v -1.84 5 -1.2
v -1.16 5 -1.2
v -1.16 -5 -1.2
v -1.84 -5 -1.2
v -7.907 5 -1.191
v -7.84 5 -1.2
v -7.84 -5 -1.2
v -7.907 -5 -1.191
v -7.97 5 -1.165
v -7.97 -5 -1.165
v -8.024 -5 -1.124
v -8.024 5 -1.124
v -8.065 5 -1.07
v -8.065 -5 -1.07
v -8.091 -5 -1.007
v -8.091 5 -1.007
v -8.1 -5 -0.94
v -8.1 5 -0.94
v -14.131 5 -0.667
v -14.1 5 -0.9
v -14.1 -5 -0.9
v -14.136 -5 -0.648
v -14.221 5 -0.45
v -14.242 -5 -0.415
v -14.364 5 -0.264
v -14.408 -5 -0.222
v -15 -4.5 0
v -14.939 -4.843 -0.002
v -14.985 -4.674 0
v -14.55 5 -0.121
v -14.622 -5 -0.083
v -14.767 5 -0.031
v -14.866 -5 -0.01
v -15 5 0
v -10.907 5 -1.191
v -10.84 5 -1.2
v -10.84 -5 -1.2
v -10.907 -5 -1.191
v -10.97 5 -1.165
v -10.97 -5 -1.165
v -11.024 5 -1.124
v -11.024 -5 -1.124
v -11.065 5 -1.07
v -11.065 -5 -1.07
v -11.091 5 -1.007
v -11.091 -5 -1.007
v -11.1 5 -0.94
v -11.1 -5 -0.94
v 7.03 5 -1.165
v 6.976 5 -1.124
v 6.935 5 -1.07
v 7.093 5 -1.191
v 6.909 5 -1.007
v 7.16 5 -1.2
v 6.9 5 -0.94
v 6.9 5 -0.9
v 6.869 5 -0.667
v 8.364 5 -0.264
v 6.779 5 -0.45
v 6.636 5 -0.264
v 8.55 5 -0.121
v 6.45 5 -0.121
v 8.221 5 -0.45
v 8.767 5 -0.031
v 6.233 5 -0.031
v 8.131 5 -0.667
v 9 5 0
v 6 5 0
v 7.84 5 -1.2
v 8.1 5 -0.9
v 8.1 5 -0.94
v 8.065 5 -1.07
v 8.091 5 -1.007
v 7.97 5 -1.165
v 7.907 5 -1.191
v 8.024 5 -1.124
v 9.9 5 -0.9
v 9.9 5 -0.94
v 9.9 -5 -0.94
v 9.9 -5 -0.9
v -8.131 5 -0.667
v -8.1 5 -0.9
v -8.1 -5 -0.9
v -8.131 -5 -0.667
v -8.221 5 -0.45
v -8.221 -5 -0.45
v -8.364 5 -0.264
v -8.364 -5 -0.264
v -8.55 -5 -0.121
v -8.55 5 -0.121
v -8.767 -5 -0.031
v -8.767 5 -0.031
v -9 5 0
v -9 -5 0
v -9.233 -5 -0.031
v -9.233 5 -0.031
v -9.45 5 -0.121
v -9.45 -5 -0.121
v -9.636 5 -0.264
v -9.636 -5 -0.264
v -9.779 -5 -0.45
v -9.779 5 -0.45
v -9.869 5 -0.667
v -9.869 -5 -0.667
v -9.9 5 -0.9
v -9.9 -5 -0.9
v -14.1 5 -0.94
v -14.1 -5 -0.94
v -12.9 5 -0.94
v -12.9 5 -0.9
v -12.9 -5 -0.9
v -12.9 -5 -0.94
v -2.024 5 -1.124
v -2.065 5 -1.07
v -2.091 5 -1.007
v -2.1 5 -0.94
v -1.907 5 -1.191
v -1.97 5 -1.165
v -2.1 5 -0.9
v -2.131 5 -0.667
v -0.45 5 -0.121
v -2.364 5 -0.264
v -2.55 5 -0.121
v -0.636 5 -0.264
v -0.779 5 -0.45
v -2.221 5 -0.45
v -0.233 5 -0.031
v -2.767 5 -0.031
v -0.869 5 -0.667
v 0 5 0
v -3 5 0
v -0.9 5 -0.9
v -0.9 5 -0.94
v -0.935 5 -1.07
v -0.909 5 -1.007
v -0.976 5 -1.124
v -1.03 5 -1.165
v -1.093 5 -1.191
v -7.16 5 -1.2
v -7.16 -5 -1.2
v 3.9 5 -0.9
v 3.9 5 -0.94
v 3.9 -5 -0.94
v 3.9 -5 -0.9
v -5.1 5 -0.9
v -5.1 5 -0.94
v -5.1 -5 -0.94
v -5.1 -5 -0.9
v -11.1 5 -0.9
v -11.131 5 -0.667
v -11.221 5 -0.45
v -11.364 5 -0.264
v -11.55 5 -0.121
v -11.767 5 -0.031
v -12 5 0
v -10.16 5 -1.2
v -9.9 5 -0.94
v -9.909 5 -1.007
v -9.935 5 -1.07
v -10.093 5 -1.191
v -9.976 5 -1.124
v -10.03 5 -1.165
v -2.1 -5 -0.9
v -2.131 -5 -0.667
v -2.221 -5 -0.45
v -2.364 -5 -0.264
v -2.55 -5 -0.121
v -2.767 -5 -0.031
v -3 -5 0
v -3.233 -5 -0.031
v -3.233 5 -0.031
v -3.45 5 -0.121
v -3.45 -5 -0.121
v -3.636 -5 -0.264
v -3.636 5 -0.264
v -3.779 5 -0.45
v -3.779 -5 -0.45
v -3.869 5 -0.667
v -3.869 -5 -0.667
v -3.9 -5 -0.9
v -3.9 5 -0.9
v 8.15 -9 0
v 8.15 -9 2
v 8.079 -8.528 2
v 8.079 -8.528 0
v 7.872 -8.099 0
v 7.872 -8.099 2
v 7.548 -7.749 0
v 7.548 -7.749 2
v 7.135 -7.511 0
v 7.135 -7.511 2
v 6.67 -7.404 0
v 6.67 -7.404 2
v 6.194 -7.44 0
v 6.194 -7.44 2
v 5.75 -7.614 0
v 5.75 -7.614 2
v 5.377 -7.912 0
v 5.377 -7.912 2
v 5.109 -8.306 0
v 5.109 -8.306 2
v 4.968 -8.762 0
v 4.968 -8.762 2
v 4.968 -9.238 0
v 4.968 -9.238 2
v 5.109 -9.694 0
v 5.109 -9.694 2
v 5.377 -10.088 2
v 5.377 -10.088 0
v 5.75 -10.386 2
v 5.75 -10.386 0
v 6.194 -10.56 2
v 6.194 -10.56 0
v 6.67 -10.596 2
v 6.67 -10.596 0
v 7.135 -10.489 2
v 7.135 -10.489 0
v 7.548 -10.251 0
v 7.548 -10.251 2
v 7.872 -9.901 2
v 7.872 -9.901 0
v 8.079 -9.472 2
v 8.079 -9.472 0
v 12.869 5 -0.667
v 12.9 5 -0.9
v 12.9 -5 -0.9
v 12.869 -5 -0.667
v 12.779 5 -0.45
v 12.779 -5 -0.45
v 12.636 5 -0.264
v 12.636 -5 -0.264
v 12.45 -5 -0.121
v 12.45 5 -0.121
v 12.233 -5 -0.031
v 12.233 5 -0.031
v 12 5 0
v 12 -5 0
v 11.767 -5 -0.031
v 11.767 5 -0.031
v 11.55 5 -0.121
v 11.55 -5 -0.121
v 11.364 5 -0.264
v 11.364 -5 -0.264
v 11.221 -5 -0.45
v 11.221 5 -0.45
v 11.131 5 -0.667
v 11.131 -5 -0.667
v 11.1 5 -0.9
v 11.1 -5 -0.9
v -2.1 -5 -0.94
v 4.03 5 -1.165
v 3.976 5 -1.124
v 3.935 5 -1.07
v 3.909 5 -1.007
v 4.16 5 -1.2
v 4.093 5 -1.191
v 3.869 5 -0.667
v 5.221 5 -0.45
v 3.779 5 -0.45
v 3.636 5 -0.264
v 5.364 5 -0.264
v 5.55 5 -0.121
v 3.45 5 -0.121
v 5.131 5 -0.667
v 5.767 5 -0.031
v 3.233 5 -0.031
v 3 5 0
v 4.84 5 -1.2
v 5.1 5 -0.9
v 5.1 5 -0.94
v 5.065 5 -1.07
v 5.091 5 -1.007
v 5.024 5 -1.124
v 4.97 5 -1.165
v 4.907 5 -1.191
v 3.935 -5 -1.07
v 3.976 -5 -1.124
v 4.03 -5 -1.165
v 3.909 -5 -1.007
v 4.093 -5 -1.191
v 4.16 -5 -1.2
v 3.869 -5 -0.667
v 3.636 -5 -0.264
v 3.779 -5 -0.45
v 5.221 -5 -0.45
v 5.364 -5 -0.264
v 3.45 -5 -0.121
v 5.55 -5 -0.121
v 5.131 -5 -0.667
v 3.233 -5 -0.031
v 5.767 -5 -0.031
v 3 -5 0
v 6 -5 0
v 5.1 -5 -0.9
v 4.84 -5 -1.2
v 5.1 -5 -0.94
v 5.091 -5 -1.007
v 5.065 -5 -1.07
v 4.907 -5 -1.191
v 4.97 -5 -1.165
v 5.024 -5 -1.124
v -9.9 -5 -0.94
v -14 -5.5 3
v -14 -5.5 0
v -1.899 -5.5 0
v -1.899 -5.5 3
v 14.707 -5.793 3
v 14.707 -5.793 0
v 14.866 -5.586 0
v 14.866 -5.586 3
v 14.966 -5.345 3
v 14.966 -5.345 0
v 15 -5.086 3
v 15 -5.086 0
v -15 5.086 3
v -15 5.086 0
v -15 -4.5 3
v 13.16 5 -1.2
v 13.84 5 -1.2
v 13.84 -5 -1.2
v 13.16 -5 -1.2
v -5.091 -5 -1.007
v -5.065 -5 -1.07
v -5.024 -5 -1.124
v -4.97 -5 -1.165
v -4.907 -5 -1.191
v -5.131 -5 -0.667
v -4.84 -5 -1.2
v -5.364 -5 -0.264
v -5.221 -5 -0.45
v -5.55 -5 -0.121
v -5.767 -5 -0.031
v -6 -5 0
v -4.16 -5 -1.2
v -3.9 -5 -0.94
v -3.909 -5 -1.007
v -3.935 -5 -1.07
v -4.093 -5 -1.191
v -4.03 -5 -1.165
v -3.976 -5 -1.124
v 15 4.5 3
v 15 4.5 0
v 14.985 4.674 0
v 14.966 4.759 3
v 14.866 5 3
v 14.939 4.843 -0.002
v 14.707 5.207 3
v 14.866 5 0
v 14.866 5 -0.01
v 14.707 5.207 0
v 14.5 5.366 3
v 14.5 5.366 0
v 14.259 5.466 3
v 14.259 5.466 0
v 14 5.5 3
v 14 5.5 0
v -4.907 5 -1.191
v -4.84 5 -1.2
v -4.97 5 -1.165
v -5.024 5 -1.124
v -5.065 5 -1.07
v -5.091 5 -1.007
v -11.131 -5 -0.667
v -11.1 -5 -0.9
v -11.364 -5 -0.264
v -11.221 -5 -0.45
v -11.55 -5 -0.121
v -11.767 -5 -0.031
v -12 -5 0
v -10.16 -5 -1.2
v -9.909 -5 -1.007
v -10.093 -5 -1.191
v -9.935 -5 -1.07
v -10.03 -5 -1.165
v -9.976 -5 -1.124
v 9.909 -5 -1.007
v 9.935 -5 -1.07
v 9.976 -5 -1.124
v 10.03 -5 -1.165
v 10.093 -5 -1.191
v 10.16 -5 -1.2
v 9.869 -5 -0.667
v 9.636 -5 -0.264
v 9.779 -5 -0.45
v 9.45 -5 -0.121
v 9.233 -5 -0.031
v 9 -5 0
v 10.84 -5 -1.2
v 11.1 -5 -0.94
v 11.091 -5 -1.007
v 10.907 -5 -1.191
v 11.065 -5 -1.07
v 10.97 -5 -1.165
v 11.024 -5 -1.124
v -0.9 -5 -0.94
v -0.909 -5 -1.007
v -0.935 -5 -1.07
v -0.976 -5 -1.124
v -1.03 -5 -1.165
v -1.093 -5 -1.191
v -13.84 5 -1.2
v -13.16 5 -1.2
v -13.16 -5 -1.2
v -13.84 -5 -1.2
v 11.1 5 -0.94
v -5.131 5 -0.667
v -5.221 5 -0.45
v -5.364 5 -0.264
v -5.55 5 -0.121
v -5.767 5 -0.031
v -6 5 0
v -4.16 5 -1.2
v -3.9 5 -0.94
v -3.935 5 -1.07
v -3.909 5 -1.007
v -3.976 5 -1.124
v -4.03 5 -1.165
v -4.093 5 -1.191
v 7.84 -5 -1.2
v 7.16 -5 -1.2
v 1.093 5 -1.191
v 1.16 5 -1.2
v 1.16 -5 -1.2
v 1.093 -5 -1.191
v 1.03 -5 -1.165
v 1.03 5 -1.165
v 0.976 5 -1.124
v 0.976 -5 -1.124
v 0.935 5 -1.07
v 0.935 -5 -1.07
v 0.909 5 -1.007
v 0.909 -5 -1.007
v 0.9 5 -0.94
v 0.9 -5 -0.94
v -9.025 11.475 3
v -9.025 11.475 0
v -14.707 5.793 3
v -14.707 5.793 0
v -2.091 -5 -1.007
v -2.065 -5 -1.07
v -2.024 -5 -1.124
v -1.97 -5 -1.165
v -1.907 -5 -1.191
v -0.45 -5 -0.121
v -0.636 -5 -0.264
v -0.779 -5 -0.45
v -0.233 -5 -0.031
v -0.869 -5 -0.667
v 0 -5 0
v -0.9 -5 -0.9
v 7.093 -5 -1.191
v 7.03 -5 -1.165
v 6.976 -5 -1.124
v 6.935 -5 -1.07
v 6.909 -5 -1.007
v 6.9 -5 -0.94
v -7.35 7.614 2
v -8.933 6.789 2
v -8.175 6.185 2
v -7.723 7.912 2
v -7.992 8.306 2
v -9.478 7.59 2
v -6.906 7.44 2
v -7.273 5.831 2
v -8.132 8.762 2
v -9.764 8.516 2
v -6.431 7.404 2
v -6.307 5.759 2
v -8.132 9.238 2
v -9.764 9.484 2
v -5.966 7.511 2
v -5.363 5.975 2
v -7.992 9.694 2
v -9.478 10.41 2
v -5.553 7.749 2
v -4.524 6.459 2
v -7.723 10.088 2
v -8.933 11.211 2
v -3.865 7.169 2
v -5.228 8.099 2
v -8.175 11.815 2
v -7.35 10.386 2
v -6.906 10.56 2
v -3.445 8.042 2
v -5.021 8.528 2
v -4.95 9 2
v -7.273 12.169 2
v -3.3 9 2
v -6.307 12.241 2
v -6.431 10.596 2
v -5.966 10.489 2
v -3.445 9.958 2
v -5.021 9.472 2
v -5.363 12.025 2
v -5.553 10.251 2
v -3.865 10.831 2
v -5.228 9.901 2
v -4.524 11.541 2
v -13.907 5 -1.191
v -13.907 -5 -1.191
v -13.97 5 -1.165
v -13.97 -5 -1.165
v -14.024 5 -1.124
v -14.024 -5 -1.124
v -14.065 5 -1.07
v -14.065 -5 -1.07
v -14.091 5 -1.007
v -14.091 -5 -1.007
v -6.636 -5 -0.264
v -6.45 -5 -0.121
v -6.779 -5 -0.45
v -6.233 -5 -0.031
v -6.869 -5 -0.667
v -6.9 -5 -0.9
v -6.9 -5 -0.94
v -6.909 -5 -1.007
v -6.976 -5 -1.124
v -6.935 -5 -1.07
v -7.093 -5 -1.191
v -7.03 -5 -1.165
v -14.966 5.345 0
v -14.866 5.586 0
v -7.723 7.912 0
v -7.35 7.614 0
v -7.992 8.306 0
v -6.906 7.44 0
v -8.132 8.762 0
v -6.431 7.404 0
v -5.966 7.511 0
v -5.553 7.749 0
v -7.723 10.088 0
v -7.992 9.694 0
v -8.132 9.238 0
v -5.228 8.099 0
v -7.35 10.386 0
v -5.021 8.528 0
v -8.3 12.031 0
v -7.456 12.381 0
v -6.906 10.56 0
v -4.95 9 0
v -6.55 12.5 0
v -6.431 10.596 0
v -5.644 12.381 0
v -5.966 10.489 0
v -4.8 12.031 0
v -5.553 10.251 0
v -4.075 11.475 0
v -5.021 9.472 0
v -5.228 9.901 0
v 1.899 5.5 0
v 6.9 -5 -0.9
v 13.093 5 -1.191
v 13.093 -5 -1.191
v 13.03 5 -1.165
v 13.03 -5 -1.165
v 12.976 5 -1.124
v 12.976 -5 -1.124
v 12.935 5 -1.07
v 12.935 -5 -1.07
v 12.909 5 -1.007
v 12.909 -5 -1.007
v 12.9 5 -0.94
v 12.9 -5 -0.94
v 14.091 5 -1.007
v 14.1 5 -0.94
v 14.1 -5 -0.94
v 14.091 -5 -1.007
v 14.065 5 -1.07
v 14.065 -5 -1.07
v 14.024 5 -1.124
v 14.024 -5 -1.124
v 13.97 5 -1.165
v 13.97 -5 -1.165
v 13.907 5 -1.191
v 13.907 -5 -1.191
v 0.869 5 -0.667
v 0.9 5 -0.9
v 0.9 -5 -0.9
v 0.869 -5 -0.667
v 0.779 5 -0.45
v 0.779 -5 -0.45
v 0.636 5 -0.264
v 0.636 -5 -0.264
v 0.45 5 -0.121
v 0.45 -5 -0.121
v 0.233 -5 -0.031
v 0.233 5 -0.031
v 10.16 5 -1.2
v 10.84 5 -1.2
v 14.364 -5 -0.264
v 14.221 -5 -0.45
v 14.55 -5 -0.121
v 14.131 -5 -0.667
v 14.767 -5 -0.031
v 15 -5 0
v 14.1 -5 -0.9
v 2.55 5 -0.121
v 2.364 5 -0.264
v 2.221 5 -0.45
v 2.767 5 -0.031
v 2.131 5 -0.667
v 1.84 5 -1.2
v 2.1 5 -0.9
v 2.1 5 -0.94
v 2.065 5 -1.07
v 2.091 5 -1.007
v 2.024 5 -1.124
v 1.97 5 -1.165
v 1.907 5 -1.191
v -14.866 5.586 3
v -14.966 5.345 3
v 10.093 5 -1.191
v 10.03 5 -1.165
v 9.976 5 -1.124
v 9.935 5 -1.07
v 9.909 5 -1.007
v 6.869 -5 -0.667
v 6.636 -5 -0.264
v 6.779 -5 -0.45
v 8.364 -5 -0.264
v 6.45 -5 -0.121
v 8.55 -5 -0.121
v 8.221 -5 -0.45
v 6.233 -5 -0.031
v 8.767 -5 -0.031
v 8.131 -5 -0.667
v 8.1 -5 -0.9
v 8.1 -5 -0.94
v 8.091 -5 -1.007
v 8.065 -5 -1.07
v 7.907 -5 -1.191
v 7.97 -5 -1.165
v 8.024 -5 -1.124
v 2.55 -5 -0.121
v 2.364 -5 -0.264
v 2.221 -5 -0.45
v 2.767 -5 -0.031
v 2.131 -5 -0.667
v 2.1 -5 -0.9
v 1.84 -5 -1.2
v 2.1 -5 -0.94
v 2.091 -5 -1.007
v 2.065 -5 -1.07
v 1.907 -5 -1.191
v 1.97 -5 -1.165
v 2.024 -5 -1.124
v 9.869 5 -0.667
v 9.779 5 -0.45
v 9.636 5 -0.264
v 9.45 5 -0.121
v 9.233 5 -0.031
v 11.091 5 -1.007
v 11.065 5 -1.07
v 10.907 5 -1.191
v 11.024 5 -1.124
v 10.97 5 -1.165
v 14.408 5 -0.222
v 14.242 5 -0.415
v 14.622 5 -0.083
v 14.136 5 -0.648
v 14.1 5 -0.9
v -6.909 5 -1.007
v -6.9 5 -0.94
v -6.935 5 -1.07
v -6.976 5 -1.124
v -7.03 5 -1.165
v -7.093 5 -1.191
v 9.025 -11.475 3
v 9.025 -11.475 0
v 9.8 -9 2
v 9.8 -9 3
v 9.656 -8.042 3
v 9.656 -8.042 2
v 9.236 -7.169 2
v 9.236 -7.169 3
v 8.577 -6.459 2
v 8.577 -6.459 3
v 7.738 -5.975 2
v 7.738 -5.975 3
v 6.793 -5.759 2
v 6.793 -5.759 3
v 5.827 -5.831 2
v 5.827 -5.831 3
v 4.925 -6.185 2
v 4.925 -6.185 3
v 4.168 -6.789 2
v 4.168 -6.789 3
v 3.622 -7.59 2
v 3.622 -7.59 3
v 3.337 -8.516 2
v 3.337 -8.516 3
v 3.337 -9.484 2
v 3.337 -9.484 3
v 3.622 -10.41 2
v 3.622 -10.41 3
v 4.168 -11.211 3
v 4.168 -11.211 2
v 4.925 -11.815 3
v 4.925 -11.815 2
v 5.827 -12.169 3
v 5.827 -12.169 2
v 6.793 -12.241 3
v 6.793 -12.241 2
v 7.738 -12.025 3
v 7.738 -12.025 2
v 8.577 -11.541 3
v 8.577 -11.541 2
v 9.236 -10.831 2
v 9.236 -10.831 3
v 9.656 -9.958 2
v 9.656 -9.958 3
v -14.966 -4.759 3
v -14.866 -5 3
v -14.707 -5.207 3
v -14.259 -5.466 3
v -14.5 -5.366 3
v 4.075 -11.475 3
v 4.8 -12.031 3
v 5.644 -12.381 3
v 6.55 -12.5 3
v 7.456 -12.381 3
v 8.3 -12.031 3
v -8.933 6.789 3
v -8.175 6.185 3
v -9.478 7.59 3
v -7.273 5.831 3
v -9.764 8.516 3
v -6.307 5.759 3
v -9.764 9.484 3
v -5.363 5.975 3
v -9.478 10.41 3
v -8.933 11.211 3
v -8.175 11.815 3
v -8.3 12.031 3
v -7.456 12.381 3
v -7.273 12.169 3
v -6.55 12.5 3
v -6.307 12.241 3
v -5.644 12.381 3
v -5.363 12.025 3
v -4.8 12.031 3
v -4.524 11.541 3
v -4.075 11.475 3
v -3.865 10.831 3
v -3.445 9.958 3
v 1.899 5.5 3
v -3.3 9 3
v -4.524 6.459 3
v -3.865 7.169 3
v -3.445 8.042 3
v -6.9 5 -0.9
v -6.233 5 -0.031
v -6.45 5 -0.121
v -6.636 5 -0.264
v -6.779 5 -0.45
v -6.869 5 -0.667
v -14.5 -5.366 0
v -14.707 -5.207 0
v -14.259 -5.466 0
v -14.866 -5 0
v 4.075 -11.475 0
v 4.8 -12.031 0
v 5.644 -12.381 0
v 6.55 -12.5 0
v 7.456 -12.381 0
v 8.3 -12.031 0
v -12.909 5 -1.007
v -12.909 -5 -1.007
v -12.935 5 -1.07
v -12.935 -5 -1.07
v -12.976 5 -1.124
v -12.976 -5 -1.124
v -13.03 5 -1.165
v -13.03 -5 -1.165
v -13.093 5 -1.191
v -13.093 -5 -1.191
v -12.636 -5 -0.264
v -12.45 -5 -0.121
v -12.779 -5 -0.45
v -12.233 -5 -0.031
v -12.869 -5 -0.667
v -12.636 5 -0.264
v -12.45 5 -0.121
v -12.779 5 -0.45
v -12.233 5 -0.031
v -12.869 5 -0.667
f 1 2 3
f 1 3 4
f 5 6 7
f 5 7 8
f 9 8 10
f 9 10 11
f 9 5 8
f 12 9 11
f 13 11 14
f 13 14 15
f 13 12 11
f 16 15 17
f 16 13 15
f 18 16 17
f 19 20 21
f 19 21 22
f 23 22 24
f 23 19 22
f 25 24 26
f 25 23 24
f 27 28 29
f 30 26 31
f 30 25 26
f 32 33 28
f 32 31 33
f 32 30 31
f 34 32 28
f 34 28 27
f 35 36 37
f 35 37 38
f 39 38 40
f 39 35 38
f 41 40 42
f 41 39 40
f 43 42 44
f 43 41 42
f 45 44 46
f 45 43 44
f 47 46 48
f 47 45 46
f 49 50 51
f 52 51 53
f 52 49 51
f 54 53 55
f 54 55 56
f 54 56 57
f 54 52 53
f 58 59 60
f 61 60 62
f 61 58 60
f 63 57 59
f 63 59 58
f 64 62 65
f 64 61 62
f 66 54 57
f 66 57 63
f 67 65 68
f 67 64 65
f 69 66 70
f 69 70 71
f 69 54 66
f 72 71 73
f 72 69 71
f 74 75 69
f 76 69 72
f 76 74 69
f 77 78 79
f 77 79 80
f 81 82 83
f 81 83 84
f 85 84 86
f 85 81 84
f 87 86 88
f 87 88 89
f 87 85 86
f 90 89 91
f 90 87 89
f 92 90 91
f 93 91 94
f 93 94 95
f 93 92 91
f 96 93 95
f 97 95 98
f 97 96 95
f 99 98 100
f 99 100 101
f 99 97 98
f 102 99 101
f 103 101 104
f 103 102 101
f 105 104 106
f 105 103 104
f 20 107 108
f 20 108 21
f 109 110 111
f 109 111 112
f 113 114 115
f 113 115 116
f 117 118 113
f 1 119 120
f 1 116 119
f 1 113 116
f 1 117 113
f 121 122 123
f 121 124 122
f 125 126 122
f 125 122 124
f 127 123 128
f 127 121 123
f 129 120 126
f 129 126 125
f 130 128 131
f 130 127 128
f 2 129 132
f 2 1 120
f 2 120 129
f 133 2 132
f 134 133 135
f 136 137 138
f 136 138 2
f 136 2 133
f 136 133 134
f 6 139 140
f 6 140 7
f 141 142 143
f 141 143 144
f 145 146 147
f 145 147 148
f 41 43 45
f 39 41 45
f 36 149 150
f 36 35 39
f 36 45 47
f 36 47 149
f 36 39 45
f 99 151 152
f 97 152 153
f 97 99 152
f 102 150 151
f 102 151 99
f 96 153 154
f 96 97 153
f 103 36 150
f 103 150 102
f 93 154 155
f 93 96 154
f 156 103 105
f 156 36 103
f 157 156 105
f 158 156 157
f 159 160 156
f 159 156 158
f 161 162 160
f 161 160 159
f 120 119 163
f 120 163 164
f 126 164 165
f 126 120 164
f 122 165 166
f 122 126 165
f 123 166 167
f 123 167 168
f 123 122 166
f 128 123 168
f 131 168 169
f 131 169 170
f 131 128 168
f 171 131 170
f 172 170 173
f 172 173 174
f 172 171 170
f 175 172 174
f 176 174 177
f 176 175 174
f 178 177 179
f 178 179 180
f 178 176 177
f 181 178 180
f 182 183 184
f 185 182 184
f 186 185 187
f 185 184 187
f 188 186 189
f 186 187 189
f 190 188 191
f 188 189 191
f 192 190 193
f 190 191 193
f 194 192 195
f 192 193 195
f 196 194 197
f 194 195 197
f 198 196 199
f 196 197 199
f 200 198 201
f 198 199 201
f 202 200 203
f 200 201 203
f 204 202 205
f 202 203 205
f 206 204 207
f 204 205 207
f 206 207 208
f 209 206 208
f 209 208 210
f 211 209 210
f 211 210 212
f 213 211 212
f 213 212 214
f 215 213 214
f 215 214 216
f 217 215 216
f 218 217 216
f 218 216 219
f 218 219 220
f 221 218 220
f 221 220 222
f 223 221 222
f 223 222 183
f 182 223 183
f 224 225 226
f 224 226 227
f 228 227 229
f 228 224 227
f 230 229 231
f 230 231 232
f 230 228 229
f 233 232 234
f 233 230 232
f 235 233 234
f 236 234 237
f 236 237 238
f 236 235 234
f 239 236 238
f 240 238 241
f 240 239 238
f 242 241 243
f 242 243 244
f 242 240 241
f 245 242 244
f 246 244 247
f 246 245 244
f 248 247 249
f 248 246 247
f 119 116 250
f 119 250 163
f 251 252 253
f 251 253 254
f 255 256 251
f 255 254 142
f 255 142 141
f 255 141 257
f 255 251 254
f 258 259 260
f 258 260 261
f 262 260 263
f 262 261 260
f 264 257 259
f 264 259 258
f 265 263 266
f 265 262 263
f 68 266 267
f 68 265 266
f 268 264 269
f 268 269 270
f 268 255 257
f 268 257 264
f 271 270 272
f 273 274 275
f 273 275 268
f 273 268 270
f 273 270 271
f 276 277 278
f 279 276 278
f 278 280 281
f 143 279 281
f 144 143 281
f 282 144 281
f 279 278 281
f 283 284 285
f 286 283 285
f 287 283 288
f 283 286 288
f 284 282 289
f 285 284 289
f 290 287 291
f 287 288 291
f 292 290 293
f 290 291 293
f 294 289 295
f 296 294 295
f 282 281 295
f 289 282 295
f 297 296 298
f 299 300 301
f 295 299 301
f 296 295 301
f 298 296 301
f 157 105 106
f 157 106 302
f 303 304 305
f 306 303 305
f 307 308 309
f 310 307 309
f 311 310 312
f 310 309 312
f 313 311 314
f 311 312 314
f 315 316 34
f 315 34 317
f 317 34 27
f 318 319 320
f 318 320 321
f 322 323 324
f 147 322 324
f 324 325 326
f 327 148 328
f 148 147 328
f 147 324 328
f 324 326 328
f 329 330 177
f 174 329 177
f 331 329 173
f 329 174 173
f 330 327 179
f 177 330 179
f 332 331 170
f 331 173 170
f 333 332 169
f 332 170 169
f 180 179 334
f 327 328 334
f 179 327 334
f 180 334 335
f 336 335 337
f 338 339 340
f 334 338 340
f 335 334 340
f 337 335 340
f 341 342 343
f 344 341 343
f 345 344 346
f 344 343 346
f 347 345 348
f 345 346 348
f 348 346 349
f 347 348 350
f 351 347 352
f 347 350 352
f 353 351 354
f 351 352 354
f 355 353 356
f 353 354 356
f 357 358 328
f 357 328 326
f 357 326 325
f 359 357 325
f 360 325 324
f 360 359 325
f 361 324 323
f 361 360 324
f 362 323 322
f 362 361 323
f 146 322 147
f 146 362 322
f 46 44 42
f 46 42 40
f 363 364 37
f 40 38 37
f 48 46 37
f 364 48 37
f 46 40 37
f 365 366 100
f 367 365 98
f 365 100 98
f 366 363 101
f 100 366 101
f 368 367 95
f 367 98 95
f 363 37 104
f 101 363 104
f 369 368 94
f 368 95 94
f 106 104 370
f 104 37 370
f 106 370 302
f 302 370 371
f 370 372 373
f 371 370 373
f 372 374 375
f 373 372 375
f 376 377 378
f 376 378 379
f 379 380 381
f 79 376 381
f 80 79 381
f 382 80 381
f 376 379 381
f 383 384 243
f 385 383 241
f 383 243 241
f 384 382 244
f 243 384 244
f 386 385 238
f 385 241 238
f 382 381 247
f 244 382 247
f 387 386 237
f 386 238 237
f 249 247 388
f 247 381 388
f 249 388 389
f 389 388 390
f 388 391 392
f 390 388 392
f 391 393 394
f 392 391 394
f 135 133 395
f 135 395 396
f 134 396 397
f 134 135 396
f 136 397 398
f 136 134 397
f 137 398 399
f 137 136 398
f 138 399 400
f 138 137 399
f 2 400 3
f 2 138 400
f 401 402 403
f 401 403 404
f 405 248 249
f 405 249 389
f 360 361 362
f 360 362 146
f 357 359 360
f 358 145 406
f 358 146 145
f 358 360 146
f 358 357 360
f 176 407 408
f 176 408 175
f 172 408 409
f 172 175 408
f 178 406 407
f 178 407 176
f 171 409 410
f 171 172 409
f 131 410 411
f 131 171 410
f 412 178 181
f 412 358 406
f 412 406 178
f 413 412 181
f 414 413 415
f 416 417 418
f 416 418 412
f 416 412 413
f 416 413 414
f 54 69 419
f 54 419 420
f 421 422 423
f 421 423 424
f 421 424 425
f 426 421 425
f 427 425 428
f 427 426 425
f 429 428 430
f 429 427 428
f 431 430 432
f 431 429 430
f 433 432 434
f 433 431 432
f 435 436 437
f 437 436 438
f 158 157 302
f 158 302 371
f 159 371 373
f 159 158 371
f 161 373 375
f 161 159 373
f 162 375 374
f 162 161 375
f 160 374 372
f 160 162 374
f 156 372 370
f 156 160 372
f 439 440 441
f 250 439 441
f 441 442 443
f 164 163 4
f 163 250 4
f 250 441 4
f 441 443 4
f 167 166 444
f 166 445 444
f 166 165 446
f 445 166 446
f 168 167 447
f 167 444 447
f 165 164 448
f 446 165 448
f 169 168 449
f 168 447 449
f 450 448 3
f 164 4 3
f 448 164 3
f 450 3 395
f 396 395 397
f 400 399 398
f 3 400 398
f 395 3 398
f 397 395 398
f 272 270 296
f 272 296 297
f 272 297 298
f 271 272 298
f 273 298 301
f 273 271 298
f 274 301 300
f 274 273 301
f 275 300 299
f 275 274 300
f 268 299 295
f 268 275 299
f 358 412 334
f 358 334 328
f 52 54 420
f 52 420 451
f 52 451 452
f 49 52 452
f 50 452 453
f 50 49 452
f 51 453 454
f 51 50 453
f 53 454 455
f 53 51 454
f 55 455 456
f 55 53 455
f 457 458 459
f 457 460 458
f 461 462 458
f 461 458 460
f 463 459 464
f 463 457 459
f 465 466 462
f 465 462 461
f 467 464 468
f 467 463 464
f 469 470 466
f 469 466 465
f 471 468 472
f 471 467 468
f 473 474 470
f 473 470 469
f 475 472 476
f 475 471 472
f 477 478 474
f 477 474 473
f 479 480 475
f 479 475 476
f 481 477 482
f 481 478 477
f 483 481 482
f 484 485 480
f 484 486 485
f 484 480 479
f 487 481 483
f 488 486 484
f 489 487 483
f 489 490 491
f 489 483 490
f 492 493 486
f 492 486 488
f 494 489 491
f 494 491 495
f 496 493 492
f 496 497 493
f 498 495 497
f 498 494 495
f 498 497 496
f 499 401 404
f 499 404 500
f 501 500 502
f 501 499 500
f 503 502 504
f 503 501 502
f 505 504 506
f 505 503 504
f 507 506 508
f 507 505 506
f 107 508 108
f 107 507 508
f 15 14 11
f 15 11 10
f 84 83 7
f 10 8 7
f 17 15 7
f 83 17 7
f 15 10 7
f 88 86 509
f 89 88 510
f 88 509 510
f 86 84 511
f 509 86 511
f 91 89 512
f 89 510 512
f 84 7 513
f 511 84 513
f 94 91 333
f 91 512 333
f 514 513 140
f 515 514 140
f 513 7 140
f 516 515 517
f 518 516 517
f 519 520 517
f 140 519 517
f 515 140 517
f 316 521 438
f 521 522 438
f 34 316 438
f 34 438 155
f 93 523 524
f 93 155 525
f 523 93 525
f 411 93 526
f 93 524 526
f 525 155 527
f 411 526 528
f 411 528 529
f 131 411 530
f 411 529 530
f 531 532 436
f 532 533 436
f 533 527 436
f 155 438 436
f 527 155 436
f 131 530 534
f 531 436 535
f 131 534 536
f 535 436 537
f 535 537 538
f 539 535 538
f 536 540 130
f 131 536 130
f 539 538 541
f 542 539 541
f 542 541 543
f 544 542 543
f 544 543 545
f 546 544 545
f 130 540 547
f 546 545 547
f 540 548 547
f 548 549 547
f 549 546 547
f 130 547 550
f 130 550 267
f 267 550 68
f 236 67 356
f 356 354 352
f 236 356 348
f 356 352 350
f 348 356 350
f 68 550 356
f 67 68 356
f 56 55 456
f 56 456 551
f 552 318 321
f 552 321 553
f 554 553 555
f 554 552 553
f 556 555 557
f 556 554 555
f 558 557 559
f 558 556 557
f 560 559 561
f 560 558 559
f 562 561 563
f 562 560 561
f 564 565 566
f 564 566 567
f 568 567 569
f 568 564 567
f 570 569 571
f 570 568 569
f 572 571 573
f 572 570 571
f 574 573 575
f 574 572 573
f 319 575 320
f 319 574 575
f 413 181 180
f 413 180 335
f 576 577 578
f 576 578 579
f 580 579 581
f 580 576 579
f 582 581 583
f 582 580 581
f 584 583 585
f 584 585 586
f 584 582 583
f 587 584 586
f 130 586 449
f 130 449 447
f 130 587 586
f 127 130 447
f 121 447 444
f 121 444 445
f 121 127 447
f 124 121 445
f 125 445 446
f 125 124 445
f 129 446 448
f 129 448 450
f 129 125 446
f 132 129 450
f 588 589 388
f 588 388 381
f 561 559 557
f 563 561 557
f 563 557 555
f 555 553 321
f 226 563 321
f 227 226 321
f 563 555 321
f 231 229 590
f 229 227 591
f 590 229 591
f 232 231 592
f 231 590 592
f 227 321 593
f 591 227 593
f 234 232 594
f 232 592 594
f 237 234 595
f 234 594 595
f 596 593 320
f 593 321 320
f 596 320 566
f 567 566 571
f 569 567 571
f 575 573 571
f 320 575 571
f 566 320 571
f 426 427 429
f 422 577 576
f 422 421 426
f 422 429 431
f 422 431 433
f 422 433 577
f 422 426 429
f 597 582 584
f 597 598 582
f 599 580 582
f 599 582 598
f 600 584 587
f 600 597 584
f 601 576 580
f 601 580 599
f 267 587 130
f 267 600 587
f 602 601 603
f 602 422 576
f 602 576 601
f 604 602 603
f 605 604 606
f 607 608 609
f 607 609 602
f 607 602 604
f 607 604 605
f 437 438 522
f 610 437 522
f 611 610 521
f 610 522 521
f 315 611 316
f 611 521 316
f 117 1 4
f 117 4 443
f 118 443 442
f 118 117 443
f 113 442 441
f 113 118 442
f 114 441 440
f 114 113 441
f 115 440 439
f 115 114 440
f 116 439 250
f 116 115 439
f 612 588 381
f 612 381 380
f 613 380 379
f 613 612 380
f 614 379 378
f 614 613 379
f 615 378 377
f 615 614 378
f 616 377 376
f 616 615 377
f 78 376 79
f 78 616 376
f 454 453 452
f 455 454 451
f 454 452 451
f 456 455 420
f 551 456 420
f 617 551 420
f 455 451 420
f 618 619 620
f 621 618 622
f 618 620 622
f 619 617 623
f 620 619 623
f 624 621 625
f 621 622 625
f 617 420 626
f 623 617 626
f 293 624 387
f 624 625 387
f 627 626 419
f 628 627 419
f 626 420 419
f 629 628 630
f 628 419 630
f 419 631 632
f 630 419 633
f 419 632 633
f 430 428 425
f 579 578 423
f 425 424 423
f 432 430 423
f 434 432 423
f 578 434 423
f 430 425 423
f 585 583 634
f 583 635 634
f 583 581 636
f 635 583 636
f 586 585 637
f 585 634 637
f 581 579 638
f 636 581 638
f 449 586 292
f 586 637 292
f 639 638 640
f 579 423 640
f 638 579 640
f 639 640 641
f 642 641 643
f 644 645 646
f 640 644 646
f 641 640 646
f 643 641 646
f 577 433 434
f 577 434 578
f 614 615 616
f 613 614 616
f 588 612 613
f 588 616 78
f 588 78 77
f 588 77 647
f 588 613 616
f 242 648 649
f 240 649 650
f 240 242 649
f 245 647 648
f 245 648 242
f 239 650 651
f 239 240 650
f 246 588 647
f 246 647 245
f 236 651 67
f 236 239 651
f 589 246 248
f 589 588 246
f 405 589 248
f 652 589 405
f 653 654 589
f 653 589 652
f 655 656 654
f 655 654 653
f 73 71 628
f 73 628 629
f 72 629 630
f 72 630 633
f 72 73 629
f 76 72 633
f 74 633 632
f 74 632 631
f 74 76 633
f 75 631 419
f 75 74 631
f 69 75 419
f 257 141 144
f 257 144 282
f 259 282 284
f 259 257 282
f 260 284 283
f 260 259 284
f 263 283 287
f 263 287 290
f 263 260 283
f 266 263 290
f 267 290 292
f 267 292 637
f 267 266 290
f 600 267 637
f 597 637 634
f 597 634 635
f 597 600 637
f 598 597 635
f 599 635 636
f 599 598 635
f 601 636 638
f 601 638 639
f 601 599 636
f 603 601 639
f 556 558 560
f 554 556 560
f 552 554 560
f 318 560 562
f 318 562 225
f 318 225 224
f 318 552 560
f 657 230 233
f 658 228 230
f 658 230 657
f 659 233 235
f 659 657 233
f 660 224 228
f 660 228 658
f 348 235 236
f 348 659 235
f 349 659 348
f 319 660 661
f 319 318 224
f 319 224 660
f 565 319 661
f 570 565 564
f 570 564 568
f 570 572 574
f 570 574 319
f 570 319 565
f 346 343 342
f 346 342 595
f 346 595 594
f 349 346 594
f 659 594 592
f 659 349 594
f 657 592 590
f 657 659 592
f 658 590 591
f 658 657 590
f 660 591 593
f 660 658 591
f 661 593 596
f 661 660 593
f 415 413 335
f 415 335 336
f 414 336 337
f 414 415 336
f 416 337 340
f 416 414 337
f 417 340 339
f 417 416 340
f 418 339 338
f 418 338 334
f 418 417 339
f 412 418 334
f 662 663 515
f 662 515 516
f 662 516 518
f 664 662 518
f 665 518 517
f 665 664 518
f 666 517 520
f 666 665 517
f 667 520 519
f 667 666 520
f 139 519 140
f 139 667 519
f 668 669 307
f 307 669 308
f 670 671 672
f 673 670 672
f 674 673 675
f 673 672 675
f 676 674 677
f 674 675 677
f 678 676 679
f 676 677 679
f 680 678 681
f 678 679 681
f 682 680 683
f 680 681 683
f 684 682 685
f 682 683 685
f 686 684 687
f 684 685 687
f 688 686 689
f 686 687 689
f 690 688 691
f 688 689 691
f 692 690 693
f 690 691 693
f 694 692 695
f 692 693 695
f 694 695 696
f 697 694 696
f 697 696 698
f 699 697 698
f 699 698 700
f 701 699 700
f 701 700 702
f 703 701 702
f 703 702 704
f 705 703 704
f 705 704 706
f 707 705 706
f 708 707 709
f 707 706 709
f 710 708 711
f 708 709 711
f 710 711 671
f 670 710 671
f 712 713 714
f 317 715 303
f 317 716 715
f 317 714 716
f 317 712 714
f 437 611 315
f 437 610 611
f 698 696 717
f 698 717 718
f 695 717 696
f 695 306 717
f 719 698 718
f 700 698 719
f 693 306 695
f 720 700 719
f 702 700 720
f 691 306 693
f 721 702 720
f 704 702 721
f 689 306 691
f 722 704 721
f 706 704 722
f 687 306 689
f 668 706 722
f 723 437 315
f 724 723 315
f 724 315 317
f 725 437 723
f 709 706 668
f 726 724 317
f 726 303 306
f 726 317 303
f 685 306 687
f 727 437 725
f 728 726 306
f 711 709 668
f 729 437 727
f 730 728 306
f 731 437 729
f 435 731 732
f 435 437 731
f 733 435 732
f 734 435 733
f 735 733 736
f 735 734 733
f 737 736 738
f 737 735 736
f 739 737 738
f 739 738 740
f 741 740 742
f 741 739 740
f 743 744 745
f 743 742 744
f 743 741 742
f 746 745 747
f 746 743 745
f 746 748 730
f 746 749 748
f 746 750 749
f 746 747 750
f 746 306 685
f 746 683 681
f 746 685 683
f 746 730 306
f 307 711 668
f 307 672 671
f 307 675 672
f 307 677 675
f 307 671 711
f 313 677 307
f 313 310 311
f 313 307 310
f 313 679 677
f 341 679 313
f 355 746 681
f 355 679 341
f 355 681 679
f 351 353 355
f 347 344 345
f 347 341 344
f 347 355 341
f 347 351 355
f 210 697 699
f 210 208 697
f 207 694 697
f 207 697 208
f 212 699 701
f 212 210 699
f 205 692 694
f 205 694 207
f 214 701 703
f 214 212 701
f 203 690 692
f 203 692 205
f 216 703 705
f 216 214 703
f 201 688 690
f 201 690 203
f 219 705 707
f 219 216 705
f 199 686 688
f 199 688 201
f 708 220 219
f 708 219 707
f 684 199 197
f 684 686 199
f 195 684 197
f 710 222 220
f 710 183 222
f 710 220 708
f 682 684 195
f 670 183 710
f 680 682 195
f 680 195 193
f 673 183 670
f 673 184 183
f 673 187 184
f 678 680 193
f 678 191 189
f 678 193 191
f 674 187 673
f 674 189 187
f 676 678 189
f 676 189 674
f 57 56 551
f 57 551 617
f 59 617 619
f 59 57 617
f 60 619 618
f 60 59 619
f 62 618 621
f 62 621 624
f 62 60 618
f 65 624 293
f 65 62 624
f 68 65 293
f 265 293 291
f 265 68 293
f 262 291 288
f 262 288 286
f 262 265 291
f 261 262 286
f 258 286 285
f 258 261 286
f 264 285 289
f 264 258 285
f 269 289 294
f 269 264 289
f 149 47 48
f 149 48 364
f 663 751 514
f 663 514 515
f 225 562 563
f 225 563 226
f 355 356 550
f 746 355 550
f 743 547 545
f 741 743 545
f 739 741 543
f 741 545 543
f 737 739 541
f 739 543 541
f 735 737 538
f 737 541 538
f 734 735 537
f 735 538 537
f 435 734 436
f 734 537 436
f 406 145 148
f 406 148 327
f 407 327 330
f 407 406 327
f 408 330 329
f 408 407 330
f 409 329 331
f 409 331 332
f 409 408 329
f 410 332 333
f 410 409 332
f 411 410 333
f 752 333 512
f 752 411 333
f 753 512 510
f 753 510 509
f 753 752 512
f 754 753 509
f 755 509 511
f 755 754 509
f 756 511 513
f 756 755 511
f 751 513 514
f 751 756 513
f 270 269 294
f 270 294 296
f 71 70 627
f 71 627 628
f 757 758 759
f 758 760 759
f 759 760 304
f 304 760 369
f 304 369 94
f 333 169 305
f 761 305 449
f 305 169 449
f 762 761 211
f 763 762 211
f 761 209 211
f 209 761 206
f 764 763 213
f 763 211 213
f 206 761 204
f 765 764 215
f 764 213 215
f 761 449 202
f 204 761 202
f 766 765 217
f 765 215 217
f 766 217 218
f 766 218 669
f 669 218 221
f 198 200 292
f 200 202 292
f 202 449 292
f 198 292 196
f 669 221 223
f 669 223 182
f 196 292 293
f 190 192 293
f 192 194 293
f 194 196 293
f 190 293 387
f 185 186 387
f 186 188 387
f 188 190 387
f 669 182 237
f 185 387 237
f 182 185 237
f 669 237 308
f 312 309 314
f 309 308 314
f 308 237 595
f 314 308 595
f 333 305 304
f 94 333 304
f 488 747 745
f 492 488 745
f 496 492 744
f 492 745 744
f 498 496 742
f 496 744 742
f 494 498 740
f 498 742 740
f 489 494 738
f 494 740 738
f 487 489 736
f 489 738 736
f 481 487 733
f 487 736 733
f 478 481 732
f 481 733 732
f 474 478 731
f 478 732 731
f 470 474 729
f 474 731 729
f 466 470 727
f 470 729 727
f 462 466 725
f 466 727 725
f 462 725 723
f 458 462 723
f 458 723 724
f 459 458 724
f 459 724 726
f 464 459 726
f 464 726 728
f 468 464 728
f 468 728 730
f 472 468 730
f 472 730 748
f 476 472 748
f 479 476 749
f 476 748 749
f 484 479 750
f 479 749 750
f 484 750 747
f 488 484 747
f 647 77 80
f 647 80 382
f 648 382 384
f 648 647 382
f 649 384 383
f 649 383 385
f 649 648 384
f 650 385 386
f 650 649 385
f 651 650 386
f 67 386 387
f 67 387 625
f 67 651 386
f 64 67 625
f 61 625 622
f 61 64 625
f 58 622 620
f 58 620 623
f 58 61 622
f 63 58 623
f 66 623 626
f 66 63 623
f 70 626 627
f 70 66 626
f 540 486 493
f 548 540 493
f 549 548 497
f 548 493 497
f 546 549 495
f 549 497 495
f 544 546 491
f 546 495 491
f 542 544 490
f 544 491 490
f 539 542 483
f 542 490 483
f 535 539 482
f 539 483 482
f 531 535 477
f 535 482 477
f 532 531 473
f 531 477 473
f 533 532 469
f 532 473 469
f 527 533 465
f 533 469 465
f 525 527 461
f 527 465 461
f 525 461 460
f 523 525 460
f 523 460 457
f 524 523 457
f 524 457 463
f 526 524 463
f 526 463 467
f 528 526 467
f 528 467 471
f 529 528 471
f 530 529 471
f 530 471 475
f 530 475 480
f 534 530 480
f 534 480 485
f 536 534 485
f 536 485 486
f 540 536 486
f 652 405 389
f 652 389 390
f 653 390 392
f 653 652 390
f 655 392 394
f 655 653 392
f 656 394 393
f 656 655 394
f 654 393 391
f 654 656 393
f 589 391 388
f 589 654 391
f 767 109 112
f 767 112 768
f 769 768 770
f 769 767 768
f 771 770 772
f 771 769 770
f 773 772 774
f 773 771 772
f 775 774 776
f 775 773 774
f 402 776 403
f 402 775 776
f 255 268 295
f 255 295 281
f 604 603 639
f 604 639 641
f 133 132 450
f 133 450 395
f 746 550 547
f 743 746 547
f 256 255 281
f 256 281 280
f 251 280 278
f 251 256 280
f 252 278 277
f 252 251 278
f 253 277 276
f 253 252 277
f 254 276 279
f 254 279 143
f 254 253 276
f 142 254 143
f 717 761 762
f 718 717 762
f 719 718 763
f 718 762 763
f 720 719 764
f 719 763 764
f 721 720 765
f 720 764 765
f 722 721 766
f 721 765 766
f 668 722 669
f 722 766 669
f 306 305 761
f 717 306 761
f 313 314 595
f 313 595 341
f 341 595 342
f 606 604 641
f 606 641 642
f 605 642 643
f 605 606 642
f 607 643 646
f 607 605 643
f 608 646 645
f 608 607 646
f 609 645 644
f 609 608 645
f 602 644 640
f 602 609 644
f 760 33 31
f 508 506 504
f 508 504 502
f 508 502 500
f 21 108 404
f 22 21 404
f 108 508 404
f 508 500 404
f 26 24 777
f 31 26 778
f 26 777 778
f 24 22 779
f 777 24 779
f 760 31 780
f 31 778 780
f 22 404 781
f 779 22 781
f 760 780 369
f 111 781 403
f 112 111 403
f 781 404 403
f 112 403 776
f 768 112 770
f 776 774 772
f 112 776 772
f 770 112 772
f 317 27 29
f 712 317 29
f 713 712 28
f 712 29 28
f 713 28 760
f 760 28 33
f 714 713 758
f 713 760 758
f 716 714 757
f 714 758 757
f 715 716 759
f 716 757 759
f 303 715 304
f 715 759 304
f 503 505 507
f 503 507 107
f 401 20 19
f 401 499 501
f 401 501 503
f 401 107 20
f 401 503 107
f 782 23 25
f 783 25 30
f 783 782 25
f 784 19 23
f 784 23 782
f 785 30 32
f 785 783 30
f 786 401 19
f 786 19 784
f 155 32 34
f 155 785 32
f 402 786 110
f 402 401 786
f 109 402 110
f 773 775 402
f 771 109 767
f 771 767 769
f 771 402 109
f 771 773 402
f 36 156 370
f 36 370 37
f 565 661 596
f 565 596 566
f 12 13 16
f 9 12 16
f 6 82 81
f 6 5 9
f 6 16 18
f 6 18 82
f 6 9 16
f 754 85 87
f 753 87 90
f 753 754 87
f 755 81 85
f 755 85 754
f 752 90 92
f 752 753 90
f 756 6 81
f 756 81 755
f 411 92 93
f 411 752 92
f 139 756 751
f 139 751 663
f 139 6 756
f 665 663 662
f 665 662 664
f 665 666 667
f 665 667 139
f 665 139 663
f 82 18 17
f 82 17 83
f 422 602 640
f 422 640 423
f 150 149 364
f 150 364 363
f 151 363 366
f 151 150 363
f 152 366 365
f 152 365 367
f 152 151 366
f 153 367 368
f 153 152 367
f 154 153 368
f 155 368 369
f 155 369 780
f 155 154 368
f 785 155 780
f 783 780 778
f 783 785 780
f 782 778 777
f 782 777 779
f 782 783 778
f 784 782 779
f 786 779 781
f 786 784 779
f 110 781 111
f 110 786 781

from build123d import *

# Parameters (mm, degrees)
EXTRUDE_1_DEPTH     = 3
SKETCH_3_R          = 3.25
CUT_EXTRUDE_1_DEPTH = 1
EXTRUDE_START       = -0.5
EXTRUDE_2_DEPTH     = 10
SKETCH_5_OUTSIDE_W  = 43.322
SKETCH_5_OUTSIDE_H  = 35.322
CUT_EXTRUDE_2_DEPTH = 22.122026418
FILLET_1_R          = 1
SKETCH_6_R          = 1.6
CUT_EXTRUDE_3_DEPTH = 20.972230797


# Read off the part's stored shape, not the designer's step: 凸台-拉伸1
with BuildPart() as part:
    # 凸台-拉伸1 outline → 凸台-拉伸1 (new body)
    with BuildSketch(Plane.XY):
        with BuildLine():
            Line((15, -5.5), (15, 5.5))
            Line((15, 5.5), (1.899494937, 5.5))
            Line((1.899494937, 5.5), (-4.075378798, 11.474873734))
            ThreePointArc((-4.075378798, 11.474873734), (-6.550252532, 12.5), (-9.025126266, 11.474873734))
            Line((-9.025126266, 11.474873734), (-15, 5.5))
            Line((-15, 5.5), (-15, -5.5))
            Line((-15, -5.5), (-1.899494937, -5.5))
            Line((-1.899494937, -5.5), (4.075378798, -11.474873734))
            ThreePointArc((4.075378798, -11.474873734), (6.550252532, -12.5), (9.025126266, -11.474873734))
            Line((9.025126266, -11.474873734), (15, -5.5))
        make_face()
    extrude(amount=EXTRUDE_1_DEPTH)

    # 草图3 → 切除-拉伸1 (cut)
    with BuildSketch(Plane.XY.offset(3)):
        with Locations((-6.550252532, 9)):
            Circle(SKETCH_3_R)
        with Locations((6.550252532, -9)):
            Circle(SKETCH_3_R)
    extrude(amount=-CUT_EXTRUDE_1_DEPTH, mode=Mode.SUBTRACT)

    # 草图4 → 凸台-拉伸2 (add)
    with BuildSketch(Plane(origin=(0, 5.5, 0), x_dir=(1, 0, 0), z_dir=(0, 1, 0)).offset(EXTRUDE_START)):
        with BuildLine():
            Line((-16.16, 1.2), (-16.5, 1.2))
            Line((-16.5, 1.2), (-16.5, -0.977568186))
            Line((-16.5, -0.977568186), (16.5, -0.977568186))
            Line((16.5, -0.977568186), (16.5, 1.2))
            Line((16.5, 1.2), (16.16, 1.2))
            ThreePointArc((16.16, 1.2), (15.976152237, 1.123847763), (15.9, 0.94))
            Line((15.9, 0.94), (15.9, 0.9))
            ThreePointArc((15.9, 0.9), (15, 0), (14.1, 0.9))
            Line((14.1, 0.9), (14.1, 0.94))
            ThreePointArc((14.1, 0.94), (14.023847763, 1.123847763), (13.84, 1.2))
            Line((13.84, 1.2), (13.5, 1.2))
            Line((13.5, 1.2), (13.16, 1.2))
            ThreePointArc((13.16, 1.2), (12.976152237, 1.123847763), (12.9, 0.94))
            Line((12.9, 0.94), (12.9, 0.9))
            ThreePointArc((12.9, 0.9), (12, 0), (11.1, 0.9))
            Line((11.1, 0.9), (11.1, 0.94))
            ThreePointArc((11.1, 0.94), (11.023847763, 1.123847763), (10.84, 1.2))
            Line((10.84, 1.2), (10.5, 1.2))
            Line((10.5, 1.2), (10.16, 1.2))
            ThreePointArc((10.16, 1.2), (9.976152237, 1.123847763), (9.9, 0.94))
            Line((9.9, 0.94), (9.9, 0.9))
            ThreePointArc((9.9, 0.9), (9, 0), (8.1, 0.9))
            Line((8.1, 0.9), (8.1, 0.94))
            ThreePointArc((8.1, 0.94), (8.023847763, 1.123847763), (7.84, 1.2))
            Line((7.84, 1.2), (7.5, 1.2))
            Line((7.5, 1.2), (7.16, 1.2))
            ThreePointArc((7.16, 1.2), (6.976152237, 1.123847763), (6.9, 0.94))
            Line((6.9, 0.94), (6.9, 0.9))
            ThreePointArc((6.9, 0.9), (6, 0), (5.1, 0.9))
            Line((5.1, 0.9), (5.1, 0.94))
            ThreePointArc((5.1, 0.94), (5.023847763, 1.123847763), (4.84, 1.2))
            Line((4.84, 1.2), (4.5, 1.2))
            Line((4.5, 1.2), (4.16, 1.2))
            ThreePointArc((4.16, 1.2), (3.976152237, 1.123847763), (3.9, 0.94))
            Line((3.9, 0.94), (3.9, 0.9))
            ThreePointArc((3.9, 0.9), (3, 0), (2.1, 0.9))
            Line((2.1, 0.9), (2.1, 0.94))
            ThreePointArc((2.1, 0.94), (2.023847763, 1.123847763), (1.84, 1.2))
            Line((1.84, 1.2), (1.5, 1.2))
            Line((1.5, 1.2), (1.16, 1.2))
            ThreePointArc((1.16, 1.2), (0.976152237, 1.123847763), (0.9, 0.94))
            Line((0.9, 0.94), (0.9, 0.9))
            ThreePointArc((0.9, 0.9), (0, 0), (-0.9, 0.9))
            Line((-0.9, 0.9), (-0.9, 0.94))
            ThreePointArc((-0.9, 0.94), (-0.976152237, 1.123847763), (-1.16, 1.2))
            Line((-1.16, 1.2), (-1.5, 1.2))
            Line((-1.5, 1.2), (-1.84, 1.2))
            ThreePointArc((-1.84, 1.2), (-2.023847763, 1.123847763), (-2.1, 0.94))
            Line((-2.1, 0.94), (-2.1, 0.9))
            ThreePointArc((-2.1, 0.9), (-3, 0), (-3.9, 0.9))
            Line((-3.9, 0.9), (-3.9, 0.94))
            ThreePointArc((-3.9, 0.94), (-3.976152237, 1.123847763), (-4.16, 1.2))
            Line((-4.16, 1.2), (-4.5, 1.2))
            Line((-4.5, 1.2), (-4.84, 1.2))
            ThreePointArc((-4.84, 1.2), (-5.023847763, 1.123847763), (-5.1, 0.94))
            Line((-5.1, 0.94), (-5.1, 0.9))
            ThreePointArc((-5.1, 0.9), (-6, 0), (-6.9, 0.9))
            Line((-6.9, 0.9), (-6.9, 0.94))
            ThreePointArc((-6.9, 0.94), (-6.976152237, 1.123847763), (-7.16, 1.2))
            Line((-7.16, 1.2), (-7.5, 1.2))
            Line((-7.5, 1.2), (-7.84, 1.2))
            ThreePointArc((-7.84, 1.2), (-8.023847763, 1.123847763), (-8.1, 0.94))
            Line((-8.1, 0.94), (-8.1, 0.9))
            ThreePointArc((-8.1, 0.9), (-9, 0), (-9.9, 0.9))
            Line((-9.9, 0.9), (-9.9, 0.94))
            ThreePointArc((-9.9, 0.94), (-9.976152237, 1.123847763), (-10.16, 1.2))
            Line((-10.16, 1.2), (-10.5, 1.2))
            Line((-10.5, 1.2), (-10.84, 1.2))
            ThreePointArc((-10.84, 1.2), (-11.023847763, 1.123847763), (-11.1, 0.94))
            Line((-11.1, 0.94), (-11.1, 0.9))
            ThreePointArc((-11.1, 0.9), (-12, 0), (-12.9, 0.9))
            Line((-12.9, 0.9), (-12.9, 0.94))
            ThreePointArc((-12.9, 0.94), (-12.976152237, 1.123847763), (-13.16, 1.2))
            Line((-13.16, 1.2), (-13.5, 1.2))
            Line((-13.5, 1.2), (-13.84, 1.2))
            ThreePointArc((-13.84, 1.2), (-14.023847763, 1.123847763), (-14.1, 0.94))
            Line((-14.1, 0.94), (-14.1, 0.9))
            ThreePointArc((-14.1, 0.9), (-15, 0), (-15.9, 0.9))
            Line((-15.9, 0.9), (-15.9, 0.94))
            ThreePointArc((-15.9, 0.94), (-15.976152237, 1.123847763), (-16.16, 1.2))
        make_face()
    extrude(amount=-EXTRUDE_2_DEPTH)

    # 草图5 outside → 切除-拉伸2 (cut, through all)
    with BuildSketch(Plane.XY.offset(3)):
        Rectangle(SKETCH_5_OUTSIDE_W, SKETCH_5_OUTSIDE_H)
        with BuildLine():
            Line((15, -5.5), (15, 5.5))
            Line((15, 5.5), (1.899494937, 5.5))
            Line((1.899494937, 5.5), (-4.075378798, 11.474873734))
            ThreePointArc((-4.075378798, 11.474873734), (-6.550252532, 12.5), (-9.025126266, 11.474873734))
            Line((-9.025126266, 11.474873734), (-15, 5.5))
            Line((-15, 5.5), (-15, -5.5))
            Line((-15, -5.5), (-1.899494937, -5.5))
            Line((-1.899494937, -5.5), (4.075378798, -11.474873734))
            ThreePointArc((4.075378798, -11.474873734), (6.550252532, -12.5), (9.025126266, -11.474873734))
            Line((9.025126266, -11.474873734), (15, -5.5))
        make_face(mode=Mode.SUBTRACT)
    extrude(amount=-CUT_EXTRUDE_2_DEPTH, mode=Mode.SUBTRACT)

    # 圆角1
    # the kernel refuses this fillet: 1 mm, written as the material it takes off along each edge
    with BuildSketch(Plane(origin=(15, -5.5, -1.035533906), x_dir=(-0.7071067811865454, -0.7071067811865497, 0), z_dir=(0, 0, 1))) as fillet_1_piece_1:
        with BuildLine():
            CenterArc((FILLET_1_R * 0.414213562373, -FILLET_1_R), FILLET_1_R, 90, 45)
            Line((-FILLET_1_R * 0.292893218813, -FILLET_1_R * 0.292893218813), (0, 0))
            Line((0, 0), (FILLET_1_R * 0.414213562373, 0))
        make_face()
    extrude(amount=5.071067812, mode=Mode.SUBTRACT)
    with BuildSketch(Plane(origin=(-15, -5.5, -2.5), x_dir=(1, 0, 0), z_dir=(0, 0, 1))) as fillet_1_piece_2:
        with BuildLine():
            CenterArc((FILLET_1_R, FILLET_1_R), FILLET_1_R, 180, 90)
            Line((0, FILLET_1_R), (0, 0))
            Line((0, 0), (FILLET_1_R, 0))
        make_face()
    extrude(amount=8, mode=Mode.SUBTRACT)
    with BuildSketch(Plane(origin=(-15, 5.5, -1.035533906), x_dir=(0, -1, 0), z_dir=(0, 0, 1))) as fillet_1_piece_3:
        with BuildLine():
            CenterArc((FILLET_1_R * 0.414213562373, FILLET_1_R), FILLET_1_R, 225, 45)
            Line((-FILLET_1_R * 0.292893218813, FILLET_1_R * 0.292893218813), (0, 0))
            Line((0, 0), (FILLET_1_R * 0.414213562373, 0))
        make_face()
    extrude(amount=5.071067812, mode=Mode.SUBTRACT)
    with BuildSketch(Plane(origin=(15, 5.5, -2.5), x_dir=(0, -1, 0), z_dir=(0, 0, 1))) as fillet_1_piece_4:
        with BuildLine():
            CenterArc((FILLET_1_R, -FILLET_1_R), FILLET_1_R, 90, 90)
            Line((0, -FILLET_1_R), (0, 0))
            Line((0, 0), (FILLET_1_R, 0))
        make_face()
    extrude(amount=8, mode=Mode.SUBTRACT)

    # 草图6 → 切除-拉伸3 (cut, through all)
    with BuildSketch(Plane.XY.offset(3)):
        with Locations((-6.550252532, 9)):
            Circle(SKETCH_6_R)
        with Locations((6.550252532, -9)):
            Circle(SKETCH_6_R)
    extrude(amount=-CUT_EXTRUDE_3_DEPTH, mode=Mode.SUBTRACT)


solid = part.part
